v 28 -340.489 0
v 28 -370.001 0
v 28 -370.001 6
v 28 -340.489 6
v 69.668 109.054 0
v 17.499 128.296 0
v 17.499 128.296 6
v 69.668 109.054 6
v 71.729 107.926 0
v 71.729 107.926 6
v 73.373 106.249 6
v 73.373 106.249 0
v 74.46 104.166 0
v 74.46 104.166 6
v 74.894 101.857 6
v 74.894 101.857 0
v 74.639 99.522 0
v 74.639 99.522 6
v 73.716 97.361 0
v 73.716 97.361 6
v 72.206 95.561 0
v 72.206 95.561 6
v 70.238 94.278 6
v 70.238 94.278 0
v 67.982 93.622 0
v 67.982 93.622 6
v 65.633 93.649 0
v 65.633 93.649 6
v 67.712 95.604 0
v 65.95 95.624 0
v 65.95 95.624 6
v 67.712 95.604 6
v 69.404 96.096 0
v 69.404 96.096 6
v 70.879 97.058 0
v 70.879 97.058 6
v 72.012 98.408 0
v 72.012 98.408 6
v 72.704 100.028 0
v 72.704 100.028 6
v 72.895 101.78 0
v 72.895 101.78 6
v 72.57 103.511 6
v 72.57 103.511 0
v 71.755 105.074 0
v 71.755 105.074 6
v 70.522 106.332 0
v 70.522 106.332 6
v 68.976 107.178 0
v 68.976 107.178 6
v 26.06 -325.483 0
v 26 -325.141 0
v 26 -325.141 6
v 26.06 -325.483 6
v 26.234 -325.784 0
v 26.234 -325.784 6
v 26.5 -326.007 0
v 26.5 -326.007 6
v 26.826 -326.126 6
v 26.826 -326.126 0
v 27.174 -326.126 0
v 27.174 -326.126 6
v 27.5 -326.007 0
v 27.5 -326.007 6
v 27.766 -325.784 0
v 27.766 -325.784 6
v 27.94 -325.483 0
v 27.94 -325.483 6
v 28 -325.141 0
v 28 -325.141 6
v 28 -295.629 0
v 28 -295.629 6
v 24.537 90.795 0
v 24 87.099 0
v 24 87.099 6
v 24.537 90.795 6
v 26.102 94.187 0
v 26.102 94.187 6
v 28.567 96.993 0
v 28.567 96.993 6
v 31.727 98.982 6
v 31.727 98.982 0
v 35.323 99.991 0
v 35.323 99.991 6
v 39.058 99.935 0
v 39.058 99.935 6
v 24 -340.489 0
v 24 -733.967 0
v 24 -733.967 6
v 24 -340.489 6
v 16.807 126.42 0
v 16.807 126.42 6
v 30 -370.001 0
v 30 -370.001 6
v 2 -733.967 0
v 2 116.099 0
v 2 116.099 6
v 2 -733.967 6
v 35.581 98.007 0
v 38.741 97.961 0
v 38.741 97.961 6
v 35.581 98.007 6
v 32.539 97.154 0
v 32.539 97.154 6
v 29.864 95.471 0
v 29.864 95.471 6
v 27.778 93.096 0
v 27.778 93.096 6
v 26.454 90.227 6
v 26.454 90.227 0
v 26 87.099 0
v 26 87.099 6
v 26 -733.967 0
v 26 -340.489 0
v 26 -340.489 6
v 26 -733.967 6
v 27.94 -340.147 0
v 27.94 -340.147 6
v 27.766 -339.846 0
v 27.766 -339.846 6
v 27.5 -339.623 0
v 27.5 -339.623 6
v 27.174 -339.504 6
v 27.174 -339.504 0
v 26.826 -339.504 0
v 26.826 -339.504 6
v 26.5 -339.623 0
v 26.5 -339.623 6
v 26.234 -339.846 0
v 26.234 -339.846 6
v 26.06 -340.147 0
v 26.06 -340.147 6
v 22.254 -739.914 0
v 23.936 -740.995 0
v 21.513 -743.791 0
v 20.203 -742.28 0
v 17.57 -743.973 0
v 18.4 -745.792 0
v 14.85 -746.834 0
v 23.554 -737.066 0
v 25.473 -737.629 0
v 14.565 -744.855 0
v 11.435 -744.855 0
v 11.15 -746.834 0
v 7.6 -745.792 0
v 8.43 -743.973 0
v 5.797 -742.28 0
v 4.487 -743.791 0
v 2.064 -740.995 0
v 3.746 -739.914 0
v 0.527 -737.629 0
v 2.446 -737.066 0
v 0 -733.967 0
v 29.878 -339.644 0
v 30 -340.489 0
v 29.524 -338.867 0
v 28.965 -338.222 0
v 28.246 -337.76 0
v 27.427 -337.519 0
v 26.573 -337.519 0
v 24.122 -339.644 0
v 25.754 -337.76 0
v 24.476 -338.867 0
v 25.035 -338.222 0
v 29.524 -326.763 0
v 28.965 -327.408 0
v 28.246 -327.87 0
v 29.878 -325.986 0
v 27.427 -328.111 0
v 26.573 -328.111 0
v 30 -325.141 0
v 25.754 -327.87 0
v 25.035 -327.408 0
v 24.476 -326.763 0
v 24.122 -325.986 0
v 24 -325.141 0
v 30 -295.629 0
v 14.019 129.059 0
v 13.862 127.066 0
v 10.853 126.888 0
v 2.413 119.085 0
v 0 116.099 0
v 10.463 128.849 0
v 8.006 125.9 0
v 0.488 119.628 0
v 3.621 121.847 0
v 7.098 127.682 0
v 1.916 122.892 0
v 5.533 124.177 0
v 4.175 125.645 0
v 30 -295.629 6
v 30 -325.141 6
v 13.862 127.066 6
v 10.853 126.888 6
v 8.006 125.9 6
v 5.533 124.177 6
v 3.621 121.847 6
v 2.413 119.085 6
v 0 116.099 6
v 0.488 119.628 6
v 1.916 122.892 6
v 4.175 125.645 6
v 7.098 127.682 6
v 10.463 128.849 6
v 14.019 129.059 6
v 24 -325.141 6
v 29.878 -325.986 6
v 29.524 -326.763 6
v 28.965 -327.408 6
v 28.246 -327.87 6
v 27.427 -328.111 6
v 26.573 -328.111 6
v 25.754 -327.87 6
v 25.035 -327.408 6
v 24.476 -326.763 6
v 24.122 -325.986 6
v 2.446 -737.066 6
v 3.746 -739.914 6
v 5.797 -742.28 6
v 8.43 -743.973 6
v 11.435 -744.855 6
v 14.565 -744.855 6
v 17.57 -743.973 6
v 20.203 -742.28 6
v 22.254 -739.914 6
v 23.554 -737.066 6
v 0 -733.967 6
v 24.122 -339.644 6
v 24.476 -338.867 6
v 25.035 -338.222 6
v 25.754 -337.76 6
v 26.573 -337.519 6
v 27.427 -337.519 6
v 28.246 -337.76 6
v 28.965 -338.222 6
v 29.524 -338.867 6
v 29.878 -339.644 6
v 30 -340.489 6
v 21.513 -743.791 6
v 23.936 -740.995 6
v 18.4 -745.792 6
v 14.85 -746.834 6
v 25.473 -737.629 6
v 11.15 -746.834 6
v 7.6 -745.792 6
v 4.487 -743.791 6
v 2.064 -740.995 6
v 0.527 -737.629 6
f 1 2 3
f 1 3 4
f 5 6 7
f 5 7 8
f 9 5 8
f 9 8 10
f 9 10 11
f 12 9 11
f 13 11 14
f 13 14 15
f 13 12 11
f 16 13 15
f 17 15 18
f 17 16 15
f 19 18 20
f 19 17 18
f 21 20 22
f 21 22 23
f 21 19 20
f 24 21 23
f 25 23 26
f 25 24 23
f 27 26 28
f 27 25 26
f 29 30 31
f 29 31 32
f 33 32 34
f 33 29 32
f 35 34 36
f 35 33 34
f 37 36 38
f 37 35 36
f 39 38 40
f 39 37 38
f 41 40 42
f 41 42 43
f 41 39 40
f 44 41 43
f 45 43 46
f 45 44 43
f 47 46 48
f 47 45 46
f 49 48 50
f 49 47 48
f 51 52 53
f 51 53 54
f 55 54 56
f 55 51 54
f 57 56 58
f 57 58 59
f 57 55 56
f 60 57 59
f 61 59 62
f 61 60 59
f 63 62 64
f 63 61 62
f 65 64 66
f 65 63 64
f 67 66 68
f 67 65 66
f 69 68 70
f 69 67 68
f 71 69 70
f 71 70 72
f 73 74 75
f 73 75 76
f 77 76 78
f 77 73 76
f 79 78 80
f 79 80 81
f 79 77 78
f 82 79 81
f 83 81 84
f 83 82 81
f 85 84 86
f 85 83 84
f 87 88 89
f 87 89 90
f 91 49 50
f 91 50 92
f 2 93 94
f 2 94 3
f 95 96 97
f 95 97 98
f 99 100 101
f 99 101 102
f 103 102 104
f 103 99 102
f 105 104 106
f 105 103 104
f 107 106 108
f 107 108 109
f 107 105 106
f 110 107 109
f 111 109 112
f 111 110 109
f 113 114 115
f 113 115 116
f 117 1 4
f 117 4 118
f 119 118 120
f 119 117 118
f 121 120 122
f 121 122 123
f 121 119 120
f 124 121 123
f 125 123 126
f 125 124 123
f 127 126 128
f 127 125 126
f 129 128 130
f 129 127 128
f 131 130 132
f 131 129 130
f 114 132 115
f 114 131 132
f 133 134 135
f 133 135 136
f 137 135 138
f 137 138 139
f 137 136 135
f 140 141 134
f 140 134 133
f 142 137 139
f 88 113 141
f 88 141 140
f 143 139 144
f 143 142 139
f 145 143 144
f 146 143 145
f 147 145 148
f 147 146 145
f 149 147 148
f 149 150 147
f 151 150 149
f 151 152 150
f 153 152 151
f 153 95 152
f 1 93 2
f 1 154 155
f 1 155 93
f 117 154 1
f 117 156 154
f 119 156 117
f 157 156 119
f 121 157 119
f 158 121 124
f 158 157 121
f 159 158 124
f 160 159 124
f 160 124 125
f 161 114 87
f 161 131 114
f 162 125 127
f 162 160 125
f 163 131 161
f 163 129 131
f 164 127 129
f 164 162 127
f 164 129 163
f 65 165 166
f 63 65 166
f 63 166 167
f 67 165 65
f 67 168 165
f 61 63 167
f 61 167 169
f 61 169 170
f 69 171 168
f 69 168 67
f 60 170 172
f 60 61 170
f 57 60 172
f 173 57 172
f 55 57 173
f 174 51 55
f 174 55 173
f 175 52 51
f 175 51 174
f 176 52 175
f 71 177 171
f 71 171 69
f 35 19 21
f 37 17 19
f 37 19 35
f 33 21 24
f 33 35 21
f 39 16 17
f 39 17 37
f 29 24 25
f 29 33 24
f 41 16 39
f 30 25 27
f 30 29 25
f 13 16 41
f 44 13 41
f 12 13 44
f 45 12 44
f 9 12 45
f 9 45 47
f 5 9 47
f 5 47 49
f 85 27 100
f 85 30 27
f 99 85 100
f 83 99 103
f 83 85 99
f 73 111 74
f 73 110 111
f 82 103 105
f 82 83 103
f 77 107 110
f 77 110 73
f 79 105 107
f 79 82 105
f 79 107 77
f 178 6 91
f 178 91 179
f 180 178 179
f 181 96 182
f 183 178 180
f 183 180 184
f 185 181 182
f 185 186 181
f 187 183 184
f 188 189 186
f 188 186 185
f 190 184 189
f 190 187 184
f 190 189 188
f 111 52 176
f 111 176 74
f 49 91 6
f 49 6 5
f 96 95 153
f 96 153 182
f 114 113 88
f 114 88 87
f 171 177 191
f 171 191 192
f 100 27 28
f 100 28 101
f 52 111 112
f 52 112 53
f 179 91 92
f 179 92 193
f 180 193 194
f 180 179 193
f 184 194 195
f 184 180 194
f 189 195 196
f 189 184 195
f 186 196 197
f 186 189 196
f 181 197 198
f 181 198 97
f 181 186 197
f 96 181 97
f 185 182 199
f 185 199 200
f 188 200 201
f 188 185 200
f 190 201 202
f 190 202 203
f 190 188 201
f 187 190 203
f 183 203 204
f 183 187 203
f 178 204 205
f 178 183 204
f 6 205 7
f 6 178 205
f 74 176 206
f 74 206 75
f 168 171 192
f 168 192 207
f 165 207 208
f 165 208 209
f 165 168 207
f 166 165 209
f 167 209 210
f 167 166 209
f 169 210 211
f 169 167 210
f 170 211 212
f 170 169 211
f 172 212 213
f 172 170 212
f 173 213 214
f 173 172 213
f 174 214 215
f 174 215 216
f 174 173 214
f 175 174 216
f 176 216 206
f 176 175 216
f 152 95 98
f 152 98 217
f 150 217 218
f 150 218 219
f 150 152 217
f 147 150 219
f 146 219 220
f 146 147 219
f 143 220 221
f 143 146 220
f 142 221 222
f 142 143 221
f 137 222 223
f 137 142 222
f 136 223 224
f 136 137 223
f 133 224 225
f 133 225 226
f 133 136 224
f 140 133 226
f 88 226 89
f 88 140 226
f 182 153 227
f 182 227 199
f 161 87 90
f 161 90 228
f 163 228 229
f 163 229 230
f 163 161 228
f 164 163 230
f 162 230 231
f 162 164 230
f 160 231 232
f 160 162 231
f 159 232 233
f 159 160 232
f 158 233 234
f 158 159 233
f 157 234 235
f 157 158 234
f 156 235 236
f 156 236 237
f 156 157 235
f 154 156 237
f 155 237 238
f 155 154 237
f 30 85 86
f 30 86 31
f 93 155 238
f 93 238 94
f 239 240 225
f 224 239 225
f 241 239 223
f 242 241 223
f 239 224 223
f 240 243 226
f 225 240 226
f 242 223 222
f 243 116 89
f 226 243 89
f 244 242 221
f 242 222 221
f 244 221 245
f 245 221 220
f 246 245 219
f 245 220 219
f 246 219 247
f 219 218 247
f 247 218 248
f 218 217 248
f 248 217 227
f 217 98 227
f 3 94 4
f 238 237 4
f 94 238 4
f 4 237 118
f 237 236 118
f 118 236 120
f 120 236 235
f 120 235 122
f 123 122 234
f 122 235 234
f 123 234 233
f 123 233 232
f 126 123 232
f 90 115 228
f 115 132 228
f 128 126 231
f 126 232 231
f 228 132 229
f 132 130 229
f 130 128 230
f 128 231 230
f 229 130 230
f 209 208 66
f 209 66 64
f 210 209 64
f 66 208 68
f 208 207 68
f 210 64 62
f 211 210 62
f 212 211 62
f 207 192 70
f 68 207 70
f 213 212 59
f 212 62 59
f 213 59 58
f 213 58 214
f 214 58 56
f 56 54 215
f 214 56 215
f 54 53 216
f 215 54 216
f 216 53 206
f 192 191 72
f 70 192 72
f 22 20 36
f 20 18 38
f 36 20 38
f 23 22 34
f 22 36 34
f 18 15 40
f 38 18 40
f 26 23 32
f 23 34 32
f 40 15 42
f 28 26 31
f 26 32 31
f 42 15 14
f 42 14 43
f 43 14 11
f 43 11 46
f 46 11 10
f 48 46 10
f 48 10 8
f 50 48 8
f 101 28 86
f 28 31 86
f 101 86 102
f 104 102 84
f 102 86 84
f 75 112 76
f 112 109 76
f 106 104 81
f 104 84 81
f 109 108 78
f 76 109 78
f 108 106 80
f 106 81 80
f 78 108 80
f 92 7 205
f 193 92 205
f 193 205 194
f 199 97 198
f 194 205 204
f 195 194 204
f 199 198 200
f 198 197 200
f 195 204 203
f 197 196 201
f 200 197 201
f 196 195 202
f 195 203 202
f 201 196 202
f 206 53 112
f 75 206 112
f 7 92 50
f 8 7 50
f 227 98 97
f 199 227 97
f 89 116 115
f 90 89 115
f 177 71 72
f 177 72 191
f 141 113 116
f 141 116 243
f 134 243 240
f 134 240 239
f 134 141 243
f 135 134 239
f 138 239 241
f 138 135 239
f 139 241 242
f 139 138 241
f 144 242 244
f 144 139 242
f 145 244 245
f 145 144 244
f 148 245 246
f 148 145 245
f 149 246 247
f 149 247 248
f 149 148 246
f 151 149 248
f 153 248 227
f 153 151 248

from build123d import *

# Parameters (mm, degrees)
BOSS_EXTRUDE1_DEPTH = 6


with BuildPart() as part:
    # Sketch1 → Boss-Extrude1 (new body)
    with BuildSketch(Plane.XY):
        with BuildLine():
            Line((0, 0), (0, 100))
            Line((0, 100), (0, 116.099356626))
            ThreePointArc((0, 116.099356626), (5.566363801, 126.764301673), (17.498623517, 128.296175326))
            Line((17.498623517, 128.296175326), (69.668134054, 109.054191593))
            ThreePointArc((69.668134054, 109.054191593), (74.638707981, 99.521504918), (65.633362838, 93.649326508))
            Line((65.633362838, 93.649326508), (38.741282829, 97.960661065))
            ThreePointArc((38.741282829, 97.960661065), (29.863968579, 95.470560576), (25.999999999, 87.099356626))
            Line((25.999999999, 87.099356626), (25.999999999, -325.14105767))
            ThreePointArc((25.999999999, -325.14105767), (26.999999698, -326.141057369), (27.999999397, -325.14105767))
            Line((27.999999397, -325.14105767), (27.999999397, -295.628663382))
            Line((27.999999397, -295.628663382), (29.999999399, -295.628663382))
            Line((29.999999399, -295.628663382), (29.999999399, -325.14105767))
            ThreePointArc((29.999999399, -325.14105767), (26.999999699, -328.14105737), (23.999999999, -325.14105767))
            Line((23.999999999, -325.14105767), (23.999999999, 87.099356626))
            ThreePointArc((23.999999999, 87.099356626), (28.56650832, 96.992597657), (39.057879707, 99.93544369))
            Line((39.057879707, 99.93544369), (65.949959716, 95.624109133))
            ThreePointArc((65.949959716, 95.624109133), (72.703968573, 100.02824294), (68.976038128, 107.177757947))
            Line((68.976038128, 107.177757947), (16.806527591, 126.41974168))
            ThreePointArc((16.806527591, 126.41974168), (6.710000139, 125.123540896), (2, 116.099356626))
            Line((2, 116.099356626), (2, 100))
            Line((2, 100), (2, 0))
            Line((2, 0), (2, -733.96669053))
            ThreePointArc((2, -733.96669053), (13, -744.96669053), (24, -733.96669053))
            Line((24, -733.96669053), (24, -340.488878189))
            ThreePointArc((24, -340.488878189), (26.9999997, -337.488878489), (29.9999994, -340.488878189))
            Line((29.9999994, -340.488878189), (29.9999994, -370.001272476))
            Line((29.9999994, -370.001272476), (27.999999398, -370.001272476))
            Line((27.999999398, -370.001272476), (27.999999398, -340.488878189))
            ThreePointArc((27.999999398, -340.488878189), (26.999999699, -339.48887849), (26, -340.488878189))
            Line((26, -340.488878189), (26, -733.96669053))
            ThreePointArc((26, -733.96669053), (13, -746.96669053), (0, -733.96669053))
            Line((0, -733.96669053), (0, 0))
        make_face()
    extrude(amount=BOSS_EXTRUDE1_DEPTH)


solid = part.part
